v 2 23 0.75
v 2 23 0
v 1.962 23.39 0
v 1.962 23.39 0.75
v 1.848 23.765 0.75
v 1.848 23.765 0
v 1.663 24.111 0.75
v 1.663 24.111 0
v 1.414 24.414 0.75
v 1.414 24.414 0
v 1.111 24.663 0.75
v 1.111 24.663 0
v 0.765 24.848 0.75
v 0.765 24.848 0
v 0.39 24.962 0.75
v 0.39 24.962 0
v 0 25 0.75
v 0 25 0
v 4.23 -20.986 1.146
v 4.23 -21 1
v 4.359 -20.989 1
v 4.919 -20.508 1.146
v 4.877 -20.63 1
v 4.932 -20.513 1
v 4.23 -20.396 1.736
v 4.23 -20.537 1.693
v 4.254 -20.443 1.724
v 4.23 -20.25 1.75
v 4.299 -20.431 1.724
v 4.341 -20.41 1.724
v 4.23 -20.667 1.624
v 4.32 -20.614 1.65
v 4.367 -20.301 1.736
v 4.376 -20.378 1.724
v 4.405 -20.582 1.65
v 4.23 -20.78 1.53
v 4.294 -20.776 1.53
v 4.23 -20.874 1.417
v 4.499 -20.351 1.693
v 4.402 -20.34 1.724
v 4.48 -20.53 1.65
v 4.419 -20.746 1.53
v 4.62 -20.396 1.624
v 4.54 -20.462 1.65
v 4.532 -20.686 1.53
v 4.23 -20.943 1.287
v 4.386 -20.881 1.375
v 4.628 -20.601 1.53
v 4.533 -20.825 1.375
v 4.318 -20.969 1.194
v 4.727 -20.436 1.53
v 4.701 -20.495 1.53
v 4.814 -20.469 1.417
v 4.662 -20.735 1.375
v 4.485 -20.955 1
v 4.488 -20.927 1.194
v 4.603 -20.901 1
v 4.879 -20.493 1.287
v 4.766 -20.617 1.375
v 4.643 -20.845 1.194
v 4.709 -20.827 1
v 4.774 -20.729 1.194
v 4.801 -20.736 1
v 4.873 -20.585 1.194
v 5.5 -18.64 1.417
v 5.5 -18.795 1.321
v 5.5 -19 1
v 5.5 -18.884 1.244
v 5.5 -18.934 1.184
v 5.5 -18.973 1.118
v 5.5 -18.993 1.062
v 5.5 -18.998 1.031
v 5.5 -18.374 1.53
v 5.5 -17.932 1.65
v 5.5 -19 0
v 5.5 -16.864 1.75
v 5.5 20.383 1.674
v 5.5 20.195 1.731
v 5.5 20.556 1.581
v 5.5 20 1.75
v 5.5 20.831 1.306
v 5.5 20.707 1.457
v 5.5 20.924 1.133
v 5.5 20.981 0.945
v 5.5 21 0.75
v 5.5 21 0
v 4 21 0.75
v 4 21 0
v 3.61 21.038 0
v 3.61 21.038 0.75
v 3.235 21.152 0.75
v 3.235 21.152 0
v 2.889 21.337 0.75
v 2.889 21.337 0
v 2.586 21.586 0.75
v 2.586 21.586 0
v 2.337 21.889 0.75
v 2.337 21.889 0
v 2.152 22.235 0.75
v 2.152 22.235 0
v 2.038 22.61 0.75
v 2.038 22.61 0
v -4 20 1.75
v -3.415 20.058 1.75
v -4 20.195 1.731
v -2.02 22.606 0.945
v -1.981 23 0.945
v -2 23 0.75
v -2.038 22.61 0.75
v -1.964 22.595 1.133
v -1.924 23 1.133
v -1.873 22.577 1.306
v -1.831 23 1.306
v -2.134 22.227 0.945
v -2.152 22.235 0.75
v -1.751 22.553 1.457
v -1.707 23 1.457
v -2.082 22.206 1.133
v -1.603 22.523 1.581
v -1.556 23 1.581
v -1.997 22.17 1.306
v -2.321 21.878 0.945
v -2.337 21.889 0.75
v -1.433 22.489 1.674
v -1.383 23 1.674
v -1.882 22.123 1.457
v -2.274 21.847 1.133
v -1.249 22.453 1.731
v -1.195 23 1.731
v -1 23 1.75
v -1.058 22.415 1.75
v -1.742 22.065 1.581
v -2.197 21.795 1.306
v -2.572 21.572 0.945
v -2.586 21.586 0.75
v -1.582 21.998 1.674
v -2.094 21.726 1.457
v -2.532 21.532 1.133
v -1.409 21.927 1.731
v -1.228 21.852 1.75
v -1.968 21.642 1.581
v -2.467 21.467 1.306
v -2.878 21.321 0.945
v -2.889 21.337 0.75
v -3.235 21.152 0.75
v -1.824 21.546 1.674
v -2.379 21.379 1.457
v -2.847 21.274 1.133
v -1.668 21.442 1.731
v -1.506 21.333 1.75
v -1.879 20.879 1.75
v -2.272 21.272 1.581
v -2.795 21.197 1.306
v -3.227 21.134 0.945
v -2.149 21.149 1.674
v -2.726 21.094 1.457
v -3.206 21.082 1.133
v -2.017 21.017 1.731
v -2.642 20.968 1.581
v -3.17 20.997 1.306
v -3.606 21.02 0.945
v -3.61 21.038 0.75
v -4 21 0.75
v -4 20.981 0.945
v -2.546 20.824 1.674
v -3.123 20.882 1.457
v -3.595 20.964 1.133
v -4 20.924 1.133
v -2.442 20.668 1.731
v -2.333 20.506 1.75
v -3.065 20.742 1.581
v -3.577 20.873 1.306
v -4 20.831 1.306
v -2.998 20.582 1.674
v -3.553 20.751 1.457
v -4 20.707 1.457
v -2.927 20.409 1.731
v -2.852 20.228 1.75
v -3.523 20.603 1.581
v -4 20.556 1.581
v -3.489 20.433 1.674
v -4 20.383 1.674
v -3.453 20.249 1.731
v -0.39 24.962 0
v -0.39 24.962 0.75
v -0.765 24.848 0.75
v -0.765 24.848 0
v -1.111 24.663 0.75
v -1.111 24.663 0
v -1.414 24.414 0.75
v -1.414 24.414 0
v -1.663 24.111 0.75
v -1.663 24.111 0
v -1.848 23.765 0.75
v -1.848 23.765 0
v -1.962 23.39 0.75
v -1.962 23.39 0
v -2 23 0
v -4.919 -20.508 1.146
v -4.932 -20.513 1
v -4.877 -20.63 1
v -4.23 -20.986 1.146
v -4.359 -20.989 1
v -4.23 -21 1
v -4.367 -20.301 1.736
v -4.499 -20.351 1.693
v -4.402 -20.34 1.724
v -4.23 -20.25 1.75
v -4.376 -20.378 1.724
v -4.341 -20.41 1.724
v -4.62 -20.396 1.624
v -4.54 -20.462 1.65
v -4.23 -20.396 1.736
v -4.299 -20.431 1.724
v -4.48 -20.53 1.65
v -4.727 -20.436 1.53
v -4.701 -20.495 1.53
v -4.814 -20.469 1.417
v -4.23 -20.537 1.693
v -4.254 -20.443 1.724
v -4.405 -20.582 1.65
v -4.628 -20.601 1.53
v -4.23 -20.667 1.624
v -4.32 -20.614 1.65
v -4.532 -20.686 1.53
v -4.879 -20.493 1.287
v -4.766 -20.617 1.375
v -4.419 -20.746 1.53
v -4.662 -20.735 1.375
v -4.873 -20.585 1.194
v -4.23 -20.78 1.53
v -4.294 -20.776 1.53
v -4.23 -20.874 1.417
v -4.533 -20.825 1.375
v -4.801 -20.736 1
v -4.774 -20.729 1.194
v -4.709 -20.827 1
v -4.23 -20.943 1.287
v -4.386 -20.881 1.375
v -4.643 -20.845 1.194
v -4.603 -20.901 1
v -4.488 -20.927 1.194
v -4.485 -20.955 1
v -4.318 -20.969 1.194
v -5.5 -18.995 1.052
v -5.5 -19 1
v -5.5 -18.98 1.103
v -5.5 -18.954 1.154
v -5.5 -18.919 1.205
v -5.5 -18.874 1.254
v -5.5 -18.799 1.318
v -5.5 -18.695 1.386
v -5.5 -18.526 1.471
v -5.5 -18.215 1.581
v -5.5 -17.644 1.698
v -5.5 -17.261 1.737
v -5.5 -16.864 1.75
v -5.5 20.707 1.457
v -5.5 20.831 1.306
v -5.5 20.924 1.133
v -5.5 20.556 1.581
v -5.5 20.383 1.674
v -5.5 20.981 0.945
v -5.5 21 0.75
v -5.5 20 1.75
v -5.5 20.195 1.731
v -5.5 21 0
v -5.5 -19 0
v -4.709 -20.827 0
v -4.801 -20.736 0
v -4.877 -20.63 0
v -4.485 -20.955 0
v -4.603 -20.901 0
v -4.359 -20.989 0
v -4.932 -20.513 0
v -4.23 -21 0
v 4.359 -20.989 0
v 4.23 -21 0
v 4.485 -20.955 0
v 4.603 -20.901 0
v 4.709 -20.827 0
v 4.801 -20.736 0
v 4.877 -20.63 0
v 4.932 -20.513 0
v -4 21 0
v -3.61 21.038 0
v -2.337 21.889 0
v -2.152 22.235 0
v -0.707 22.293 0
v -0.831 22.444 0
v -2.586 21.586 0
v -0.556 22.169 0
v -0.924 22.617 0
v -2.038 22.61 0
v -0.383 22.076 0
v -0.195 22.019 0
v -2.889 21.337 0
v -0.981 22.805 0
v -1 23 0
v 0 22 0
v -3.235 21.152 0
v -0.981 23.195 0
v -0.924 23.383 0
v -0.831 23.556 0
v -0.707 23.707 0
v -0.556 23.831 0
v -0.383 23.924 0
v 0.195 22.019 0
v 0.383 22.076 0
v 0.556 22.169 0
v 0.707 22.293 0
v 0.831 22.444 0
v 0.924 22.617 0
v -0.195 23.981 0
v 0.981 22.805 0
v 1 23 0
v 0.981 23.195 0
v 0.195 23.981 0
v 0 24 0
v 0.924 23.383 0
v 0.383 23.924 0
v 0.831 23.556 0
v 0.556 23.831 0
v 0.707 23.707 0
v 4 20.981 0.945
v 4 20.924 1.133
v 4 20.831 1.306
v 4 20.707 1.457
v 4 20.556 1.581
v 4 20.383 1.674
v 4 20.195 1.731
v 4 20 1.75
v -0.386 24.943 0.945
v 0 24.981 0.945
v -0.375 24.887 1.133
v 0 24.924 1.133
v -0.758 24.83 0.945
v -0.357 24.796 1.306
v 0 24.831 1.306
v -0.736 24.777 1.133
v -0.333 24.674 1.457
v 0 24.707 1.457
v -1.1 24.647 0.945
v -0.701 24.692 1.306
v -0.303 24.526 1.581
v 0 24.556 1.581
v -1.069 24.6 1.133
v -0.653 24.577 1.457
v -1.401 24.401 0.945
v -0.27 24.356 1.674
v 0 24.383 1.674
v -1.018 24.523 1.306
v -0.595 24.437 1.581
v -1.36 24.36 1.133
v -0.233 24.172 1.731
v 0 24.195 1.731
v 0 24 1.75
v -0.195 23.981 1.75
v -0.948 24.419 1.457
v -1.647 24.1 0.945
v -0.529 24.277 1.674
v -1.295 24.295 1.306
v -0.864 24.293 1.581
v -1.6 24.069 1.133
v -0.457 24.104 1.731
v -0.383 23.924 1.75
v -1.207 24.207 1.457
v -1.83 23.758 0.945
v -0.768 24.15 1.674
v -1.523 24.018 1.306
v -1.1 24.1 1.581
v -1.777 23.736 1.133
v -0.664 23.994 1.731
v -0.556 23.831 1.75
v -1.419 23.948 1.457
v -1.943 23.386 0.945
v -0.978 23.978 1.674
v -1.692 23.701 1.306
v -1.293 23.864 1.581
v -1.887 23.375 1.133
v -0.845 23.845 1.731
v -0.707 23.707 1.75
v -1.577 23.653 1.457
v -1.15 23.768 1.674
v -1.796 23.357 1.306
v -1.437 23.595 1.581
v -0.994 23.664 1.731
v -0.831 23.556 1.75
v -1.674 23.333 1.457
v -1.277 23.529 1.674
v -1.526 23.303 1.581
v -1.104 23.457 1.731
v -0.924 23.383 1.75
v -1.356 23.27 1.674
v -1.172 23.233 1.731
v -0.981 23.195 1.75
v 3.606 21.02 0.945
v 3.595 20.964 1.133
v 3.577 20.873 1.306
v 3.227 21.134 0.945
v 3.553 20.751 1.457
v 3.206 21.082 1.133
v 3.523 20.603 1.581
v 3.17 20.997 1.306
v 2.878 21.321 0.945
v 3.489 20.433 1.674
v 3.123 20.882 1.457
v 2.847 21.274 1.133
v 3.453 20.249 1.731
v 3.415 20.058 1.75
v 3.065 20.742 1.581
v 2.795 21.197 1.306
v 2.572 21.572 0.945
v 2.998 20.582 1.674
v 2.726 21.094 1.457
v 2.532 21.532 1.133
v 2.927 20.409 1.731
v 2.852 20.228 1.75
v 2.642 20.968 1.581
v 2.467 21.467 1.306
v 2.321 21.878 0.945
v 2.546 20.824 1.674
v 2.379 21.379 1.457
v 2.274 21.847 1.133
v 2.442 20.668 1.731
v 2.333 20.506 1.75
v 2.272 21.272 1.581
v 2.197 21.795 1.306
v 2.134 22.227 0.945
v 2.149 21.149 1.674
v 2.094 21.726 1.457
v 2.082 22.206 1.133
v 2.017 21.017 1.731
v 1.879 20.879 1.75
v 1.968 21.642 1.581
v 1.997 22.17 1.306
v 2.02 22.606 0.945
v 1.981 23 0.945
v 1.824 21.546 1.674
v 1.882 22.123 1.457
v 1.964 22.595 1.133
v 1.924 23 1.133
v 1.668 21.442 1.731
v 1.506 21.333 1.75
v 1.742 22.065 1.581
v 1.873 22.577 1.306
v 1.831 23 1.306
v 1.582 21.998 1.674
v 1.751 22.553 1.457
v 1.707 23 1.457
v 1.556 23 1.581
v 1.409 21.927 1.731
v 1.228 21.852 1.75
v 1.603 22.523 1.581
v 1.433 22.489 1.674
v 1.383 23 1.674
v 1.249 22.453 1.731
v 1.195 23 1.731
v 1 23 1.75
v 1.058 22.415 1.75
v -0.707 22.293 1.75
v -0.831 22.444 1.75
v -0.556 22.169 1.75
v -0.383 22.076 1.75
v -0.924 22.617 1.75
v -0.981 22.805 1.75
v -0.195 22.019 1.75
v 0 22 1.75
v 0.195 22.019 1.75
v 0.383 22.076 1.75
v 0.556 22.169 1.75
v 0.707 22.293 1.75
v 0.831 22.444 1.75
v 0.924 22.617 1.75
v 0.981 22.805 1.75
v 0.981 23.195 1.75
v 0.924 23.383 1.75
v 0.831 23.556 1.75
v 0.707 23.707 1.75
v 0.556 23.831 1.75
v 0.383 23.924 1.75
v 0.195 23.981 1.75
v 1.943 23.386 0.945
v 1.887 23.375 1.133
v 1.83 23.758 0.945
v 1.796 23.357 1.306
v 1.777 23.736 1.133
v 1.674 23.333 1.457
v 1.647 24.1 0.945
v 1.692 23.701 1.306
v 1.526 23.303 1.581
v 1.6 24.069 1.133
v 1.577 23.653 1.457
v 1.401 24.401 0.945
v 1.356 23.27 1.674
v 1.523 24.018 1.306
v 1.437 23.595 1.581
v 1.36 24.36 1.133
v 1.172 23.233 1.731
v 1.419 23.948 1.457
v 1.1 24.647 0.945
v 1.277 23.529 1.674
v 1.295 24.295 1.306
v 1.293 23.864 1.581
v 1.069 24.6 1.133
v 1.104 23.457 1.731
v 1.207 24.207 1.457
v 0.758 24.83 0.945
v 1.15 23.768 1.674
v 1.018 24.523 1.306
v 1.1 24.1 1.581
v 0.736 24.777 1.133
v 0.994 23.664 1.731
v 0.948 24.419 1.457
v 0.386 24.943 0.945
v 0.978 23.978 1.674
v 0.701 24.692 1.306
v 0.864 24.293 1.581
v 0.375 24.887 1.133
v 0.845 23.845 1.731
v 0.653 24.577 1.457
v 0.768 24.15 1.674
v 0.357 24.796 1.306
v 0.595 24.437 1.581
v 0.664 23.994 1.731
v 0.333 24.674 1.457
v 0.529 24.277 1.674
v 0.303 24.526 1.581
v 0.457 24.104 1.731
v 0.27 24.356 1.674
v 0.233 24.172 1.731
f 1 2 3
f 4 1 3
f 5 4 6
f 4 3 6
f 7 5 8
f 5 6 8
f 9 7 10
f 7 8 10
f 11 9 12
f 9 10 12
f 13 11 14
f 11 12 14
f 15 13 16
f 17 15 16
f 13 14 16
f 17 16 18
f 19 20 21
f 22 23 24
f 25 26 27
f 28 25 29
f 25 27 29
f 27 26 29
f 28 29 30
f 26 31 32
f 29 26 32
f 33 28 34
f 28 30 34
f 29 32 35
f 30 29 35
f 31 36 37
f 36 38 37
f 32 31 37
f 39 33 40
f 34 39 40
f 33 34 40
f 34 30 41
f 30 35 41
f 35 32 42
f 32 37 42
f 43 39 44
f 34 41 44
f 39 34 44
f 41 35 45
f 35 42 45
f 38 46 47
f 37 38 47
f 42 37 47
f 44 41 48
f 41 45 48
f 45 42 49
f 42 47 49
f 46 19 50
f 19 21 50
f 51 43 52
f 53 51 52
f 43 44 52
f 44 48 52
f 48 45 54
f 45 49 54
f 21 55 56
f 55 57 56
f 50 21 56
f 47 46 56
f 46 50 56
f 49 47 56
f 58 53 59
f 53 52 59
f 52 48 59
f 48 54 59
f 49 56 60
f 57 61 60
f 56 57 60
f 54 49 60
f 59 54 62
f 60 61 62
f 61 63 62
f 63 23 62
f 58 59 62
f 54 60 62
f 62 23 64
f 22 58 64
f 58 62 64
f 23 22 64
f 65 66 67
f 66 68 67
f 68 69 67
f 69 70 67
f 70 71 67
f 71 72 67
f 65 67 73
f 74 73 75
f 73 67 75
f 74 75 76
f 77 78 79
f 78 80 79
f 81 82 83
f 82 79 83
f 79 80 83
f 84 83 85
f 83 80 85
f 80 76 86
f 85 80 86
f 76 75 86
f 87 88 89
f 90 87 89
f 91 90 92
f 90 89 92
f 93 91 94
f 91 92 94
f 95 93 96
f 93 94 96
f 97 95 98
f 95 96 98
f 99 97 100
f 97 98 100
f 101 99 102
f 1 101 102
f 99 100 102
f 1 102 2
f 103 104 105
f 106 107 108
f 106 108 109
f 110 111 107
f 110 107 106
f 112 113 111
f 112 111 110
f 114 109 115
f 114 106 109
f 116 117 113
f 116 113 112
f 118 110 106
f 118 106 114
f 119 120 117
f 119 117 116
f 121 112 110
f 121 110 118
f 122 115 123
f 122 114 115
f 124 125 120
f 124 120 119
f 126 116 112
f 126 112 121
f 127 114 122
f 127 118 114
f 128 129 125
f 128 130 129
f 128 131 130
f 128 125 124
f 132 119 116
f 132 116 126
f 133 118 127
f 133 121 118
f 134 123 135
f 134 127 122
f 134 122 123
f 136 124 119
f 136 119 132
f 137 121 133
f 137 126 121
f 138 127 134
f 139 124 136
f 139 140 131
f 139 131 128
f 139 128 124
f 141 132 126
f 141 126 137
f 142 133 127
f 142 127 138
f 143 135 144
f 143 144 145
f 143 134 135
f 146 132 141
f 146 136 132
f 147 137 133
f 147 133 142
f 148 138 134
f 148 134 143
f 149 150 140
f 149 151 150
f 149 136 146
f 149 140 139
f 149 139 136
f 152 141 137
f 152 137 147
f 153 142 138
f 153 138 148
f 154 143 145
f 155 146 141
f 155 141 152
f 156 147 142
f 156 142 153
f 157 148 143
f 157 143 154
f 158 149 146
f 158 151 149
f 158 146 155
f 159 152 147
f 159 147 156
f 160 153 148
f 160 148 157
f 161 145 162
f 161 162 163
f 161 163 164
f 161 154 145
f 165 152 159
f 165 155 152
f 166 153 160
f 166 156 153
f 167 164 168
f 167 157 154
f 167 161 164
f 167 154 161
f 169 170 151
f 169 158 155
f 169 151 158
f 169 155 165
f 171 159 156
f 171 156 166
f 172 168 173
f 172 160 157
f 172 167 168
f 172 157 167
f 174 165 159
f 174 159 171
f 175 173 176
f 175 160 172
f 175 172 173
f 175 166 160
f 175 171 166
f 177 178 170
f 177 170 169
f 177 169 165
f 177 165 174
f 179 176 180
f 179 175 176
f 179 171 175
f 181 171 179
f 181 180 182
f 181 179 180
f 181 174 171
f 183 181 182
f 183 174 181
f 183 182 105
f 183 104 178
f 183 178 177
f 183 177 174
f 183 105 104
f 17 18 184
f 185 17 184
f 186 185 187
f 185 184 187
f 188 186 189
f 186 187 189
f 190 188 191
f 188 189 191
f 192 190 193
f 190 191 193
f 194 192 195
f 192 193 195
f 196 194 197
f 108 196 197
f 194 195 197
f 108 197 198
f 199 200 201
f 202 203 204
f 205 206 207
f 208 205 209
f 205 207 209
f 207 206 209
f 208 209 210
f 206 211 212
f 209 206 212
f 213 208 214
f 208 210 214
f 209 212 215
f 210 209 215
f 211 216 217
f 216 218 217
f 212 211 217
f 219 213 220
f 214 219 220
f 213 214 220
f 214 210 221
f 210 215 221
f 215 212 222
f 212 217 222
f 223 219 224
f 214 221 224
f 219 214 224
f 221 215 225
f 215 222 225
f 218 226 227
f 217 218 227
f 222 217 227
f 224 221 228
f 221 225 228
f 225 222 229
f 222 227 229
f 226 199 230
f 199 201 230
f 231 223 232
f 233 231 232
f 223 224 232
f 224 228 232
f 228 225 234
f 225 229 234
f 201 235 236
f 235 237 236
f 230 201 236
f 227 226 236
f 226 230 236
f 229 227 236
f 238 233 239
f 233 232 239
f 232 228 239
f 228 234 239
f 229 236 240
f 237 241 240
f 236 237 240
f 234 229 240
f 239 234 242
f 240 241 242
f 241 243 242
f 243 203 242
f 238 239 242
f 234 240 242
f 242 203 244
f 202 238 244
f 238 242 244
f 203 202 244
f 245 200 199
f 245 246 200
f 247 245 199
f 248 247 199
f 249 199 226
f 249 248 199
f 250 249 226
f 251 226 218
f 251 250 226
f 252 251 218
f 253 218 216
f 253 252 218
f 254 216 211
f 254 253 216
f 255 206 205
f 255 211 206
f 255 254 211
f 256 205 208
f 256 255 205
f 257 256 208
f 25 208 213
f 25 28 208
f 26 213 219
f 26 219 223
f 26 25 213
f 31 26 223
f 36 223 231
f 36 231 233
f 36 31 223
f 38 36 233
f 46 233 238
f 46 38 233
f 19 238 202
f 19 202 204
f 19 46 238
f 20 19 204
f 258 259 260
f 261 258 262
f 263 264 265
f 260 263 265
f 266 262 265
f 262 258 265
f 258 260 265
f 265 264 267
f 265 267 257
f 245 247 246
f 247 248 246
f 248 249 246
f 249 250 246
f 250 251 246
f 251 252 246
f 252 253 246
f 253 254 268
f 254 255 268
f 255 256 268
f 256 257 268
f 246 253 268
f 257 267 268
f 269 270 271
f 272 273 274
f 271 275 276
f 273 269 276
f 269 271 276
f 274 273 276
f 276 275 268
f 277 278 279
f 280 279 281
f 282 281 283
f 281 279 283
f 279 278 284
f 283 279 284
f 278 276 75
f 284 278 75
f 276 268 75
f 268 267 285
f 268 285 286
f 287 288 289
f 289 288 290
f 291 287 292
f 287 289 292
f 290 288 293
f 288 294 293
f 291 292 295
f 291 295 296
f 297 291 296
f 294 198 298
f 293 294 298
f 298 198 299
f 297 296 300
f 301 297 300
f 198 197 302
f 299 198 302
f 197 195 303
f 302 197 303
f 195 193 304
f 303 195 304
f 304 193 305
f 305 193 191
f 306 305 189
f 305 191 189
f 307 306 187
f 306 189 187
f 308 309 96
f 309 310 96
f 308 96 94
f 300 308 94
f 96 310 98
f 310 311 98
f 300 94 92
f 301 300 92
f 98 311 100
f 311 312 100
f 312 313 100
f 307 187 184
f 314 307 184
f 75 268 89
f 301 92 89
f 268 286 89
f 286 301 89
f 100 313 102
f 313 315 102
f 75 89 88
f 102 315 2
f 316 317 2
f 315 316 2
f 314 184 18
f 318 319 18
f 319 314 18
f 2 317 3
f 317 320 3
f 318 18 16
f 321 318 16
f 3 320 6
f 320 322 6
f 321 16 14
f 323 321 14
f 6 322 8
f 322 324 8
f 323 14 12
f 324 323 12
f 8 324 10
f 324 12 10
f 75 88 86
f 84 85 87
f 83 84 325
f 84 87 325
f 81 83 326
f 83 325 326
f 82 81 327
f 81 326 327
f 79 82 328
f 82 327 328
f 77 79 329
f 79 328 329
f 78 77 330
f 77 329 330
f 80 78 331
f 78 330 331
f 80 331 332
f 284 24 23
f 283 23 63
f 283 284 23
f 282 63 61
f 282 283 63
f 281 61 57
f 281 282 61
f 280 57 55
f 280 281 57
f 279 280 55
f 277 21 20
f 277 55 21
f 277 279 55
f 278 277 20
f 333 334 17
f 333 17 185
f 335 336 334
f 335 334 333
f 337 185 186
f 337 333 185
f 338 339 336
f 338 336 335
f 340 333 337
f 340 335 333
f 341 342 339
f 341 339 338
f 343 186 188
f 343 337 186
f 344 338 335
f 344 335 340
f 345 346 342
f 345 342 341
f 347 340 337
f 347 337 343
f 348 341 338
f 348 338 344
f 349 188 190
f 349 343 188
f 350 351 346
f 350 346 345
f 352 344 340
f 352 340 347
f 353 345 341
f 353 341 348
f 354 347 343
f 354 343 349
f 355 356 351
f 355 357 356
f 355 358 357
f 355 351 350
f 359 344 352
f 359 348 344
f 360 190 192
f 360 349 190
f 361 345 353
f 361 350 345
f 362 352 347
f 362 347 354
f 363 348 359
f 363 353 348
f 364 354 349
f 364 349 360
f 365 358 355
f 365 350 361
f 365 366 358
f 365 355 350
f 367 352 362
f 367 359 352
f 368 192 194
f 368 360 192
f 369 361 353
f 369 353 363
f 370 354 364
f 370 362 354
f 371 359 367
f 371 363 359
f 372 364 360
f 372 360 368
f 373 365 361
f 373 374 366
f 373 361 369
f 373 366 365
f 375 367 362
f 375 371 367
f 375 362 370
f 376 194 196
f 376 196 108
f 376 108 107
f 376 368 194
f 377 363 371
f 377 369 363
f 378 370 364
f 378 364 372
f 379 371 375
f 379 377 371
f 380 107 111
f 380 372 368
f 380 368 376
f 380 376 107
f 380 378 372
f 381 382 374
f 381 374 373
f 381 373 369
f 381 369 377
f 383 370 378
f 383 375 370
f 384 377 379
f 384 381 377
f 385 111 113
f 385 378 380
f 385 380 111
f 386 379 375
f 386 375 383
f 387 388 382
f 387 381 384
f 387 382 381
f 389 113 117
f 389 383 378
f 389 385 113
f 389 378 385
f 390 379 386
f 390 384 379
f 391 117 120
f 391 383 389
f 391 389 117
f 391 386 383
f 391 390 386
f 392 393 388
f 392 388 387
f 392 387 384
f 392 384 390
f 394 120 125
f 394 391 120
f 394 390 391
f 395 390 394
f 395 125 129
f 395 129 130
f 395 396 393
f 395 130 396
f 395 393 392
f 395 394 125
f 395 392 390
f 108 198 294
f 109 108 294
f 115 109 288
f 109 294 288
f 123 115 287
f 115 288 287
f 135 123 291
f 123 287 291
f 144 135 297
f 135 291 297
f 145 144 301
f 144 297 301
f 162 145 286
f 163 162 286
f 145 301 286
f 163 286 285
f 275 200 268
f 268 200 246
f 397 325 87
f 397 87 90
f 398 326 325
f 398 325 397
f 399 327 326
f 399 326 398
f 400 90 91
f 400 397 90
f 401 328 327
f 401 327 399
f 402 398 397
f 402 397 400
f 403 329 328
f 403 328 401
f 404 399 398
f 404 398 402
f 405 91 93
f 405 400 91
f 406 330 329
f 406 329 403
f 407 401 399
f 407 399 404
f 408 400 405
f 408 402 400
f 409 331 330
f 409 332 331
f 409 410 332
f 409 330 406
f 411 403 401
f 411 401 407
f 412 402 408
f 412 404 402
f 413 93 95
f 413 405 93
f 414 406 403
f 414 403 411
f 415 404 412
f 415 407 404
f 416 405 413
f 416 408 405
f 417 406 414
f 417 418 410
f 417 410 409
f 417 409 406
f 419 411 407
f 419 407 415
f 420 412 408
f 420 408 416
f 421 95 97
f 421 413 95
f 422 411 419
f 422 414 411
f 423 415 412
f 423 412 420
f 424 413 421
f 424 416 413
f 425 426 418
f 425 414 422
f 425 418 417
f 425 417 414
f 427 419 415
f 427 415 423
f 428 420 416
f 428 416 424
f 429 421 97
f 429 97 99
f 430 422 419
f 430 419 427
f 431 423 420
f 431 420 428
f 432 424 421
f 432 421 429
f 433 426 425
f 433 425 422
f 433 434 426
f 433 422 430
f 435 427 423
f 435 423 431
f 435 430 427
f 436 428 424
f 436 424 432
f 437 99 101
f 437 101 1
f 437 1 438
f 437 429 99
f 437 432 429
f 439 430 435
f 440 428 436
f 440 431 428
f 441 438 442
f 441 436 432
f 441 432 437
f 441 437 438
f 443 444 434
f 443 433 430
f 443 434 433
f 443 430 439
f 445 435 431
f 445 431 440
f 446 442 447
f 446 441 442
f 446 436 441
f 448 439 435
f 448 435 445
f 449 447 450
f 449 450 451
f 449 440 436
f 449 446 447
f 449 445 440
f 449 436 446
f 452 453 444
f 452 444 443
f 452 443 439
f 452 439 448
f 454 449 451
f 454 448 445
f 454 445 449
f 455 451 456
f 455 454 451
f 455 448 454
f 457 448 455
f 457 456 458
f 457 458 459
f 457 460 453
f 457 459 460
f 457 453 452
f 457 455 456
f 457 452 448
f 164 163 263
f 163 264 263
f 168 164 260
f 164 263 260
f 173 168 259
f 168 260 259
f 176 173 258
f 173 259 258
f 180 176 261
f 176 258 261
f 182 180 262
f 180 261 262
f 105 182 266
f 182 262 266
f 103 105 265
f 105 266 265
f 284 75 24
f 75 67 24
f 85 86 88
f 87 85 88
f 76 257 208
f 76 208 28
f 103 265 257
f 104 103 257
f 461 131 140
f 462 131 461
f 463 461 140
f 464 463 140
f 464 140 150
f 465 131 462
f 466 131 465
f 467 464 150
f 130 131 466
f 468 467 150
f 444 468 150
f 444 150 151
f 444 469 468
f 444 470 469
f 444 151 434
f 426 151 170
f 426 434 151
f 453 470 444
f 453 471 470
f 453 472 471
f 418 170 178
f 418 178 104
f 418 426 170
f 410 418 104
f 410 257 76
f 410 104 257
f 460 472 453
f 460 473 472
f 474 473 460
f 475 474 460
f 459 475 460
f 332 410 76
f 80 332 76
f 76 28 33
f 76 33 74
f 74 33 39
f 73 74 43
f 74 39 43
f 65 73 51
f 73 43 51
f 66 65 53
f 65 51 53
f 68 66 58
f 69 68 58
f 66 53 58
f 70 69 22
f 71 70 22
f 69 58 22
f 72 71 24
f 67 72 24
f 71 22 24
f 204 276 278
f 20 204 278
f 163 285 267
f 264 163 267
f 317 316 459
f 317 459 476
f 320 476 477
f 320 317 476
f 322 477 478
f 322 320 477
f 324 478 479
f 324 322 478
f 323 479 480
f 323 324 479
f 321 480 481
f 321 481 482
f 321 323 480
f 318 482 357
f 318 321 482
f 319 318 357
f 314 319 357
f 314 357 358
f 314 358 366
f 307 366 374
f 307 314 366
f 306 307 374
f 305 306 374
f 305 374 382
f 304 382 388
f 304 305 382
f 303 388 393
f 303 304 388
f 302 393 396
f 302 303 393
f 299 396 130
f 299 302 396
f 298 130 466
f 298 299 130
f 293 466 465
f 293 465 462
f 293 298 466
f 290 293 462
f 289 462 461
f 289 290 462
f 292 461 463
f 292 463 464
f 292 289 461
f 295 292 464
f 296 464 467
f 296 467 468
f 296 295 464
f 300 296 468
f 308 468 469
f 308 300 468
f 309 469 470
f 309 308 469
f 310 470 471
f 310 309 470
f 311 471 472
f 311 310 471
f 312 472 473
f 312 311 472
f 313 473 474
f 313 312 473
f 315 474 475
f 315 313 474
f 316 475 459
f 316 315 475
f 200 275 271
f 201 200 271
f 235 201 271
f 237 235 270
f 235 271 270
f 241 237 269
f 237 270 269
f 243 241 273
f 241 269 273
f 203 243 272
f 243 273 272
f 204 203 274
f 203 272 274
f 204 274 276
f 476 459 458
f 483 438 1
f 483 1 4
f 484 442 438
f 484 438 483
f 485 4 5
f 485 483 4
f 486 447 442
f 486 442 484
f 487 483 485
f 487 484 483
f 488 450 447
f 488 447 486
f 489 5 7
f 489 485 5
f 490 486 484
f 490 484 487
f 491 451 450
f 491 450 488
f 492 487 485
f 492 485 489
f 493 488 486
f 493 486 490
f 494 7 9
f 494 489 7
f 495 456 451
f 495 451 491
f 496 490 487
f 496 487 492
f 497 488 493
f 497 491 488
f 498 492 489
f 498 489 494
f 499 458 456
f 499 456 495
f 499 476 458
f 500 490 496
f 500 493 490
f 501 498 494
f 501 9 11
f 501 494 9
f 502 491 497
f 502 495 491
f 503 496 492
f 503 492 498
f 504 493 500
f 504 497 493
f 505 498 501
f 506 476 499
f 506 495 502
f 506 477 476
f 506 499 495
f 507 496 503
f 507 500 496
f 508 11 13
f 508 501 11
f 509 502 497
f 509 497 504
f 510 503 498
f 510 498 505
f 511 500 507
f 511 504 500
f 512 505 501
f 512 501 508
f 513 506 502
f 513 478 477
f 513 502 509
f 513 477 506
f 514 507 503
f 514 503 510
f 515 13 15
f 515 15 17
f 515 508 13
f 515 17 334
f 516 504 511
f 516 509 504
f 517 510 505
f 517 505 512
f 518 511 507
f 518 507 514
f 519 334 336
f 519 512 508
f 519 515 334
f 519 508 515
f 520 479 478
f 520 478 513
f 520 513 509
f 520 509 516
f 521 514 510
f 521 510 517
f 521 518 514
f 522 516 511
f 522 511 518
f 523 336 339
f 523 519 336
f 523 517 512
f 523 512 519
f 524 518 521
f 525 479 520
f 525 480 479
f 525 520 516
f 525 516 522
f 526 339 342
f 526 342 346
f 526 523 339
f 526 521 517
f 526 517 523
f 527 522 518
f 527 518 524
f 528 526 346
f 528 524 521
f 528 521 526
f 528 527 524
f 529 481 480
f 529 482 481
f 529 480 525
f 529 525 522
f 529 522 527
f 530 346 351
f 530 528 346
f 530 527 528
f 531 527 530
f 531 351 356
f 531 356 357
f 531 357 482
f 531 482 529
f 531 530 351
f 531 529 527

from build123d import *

# Parameters (mm, degrees)
F0_R     = 1
F1_DEPTH = 1.75
F2_R     = 0.99999
F4_DEPTH = 25
F5_R     = 0.75


# Not quite as in the source:
# - a fillet or chamfer is up to 0.001 mm smaller than in the source, because OpenCascade refuses the exact size


with BuildPart() as f1:
    # F0 (on Top) → F1 (new body)
    with BuildSketch(Plane.XY):
        with BuildLine():
            Line((-5.5, -21), (5.5, -21))
            Line((5.5, -21), (5.5, 21))
            Line((5.5, 21), (4, 21))
            ThreePointArc((4, 21), (2.5857864376, 21.5857864376), (2, 23))
            ThreePointArc((2, 23), (1.4142135624, 24.4142135624), (0, 25))
            ThreePointArc((0, 25), (-1.4142135624, 24.4142135624), (-2, 23))
            ThreePointArc((-2, 23), (-2.5857864376, 21.5857864376), (-4, 21))
            Line((-4, 21), (-5.5, 21))
            Line((-5.5, 21), (-5.5, -21))
        make_face()
        with Locations((0, 23)):
            Circle(F0_R, mode=Mode.SUBTRACT)
    extrude(amount=F1_DEPTH)

    # F2 (radius 1 in the source; OpenCascade refuses exactly that, so slightly less here)
    f2_edges = [f1.edges().sort_by_distance(p)[0] for p in [
        (-2.585786, 21.585786, 1.75),
    ]]
    fillet(f2_edges, radius=F2_R)

    # F3 (on face) → F4 (cut)
    with BuildSketch(Plane.XY.offset(1.75)):
        Polygon((-5.5, -21), (-4.75, -21), (-5.5, -19), align=None)
        Polygon((5.5, -19), (4.75, -21), (5.5, -21), align=None)
    extrude(amount=-F4_DEPTH, mode=Mode.SUBTRACT)

    # F5
    f5_edges = [f1.edges().sort_by_distance(p)[0] for p in [
        (-5.125, -20, 1.75),
        (0, -21, 1.75),
        (5.125, -20, 1.75),
        (-4.75, -21, 0.875),
        (4.75, -21, 0.875),
    ]]
    fillet(f5_edges, radius=F5_R)


solid = f1.part
